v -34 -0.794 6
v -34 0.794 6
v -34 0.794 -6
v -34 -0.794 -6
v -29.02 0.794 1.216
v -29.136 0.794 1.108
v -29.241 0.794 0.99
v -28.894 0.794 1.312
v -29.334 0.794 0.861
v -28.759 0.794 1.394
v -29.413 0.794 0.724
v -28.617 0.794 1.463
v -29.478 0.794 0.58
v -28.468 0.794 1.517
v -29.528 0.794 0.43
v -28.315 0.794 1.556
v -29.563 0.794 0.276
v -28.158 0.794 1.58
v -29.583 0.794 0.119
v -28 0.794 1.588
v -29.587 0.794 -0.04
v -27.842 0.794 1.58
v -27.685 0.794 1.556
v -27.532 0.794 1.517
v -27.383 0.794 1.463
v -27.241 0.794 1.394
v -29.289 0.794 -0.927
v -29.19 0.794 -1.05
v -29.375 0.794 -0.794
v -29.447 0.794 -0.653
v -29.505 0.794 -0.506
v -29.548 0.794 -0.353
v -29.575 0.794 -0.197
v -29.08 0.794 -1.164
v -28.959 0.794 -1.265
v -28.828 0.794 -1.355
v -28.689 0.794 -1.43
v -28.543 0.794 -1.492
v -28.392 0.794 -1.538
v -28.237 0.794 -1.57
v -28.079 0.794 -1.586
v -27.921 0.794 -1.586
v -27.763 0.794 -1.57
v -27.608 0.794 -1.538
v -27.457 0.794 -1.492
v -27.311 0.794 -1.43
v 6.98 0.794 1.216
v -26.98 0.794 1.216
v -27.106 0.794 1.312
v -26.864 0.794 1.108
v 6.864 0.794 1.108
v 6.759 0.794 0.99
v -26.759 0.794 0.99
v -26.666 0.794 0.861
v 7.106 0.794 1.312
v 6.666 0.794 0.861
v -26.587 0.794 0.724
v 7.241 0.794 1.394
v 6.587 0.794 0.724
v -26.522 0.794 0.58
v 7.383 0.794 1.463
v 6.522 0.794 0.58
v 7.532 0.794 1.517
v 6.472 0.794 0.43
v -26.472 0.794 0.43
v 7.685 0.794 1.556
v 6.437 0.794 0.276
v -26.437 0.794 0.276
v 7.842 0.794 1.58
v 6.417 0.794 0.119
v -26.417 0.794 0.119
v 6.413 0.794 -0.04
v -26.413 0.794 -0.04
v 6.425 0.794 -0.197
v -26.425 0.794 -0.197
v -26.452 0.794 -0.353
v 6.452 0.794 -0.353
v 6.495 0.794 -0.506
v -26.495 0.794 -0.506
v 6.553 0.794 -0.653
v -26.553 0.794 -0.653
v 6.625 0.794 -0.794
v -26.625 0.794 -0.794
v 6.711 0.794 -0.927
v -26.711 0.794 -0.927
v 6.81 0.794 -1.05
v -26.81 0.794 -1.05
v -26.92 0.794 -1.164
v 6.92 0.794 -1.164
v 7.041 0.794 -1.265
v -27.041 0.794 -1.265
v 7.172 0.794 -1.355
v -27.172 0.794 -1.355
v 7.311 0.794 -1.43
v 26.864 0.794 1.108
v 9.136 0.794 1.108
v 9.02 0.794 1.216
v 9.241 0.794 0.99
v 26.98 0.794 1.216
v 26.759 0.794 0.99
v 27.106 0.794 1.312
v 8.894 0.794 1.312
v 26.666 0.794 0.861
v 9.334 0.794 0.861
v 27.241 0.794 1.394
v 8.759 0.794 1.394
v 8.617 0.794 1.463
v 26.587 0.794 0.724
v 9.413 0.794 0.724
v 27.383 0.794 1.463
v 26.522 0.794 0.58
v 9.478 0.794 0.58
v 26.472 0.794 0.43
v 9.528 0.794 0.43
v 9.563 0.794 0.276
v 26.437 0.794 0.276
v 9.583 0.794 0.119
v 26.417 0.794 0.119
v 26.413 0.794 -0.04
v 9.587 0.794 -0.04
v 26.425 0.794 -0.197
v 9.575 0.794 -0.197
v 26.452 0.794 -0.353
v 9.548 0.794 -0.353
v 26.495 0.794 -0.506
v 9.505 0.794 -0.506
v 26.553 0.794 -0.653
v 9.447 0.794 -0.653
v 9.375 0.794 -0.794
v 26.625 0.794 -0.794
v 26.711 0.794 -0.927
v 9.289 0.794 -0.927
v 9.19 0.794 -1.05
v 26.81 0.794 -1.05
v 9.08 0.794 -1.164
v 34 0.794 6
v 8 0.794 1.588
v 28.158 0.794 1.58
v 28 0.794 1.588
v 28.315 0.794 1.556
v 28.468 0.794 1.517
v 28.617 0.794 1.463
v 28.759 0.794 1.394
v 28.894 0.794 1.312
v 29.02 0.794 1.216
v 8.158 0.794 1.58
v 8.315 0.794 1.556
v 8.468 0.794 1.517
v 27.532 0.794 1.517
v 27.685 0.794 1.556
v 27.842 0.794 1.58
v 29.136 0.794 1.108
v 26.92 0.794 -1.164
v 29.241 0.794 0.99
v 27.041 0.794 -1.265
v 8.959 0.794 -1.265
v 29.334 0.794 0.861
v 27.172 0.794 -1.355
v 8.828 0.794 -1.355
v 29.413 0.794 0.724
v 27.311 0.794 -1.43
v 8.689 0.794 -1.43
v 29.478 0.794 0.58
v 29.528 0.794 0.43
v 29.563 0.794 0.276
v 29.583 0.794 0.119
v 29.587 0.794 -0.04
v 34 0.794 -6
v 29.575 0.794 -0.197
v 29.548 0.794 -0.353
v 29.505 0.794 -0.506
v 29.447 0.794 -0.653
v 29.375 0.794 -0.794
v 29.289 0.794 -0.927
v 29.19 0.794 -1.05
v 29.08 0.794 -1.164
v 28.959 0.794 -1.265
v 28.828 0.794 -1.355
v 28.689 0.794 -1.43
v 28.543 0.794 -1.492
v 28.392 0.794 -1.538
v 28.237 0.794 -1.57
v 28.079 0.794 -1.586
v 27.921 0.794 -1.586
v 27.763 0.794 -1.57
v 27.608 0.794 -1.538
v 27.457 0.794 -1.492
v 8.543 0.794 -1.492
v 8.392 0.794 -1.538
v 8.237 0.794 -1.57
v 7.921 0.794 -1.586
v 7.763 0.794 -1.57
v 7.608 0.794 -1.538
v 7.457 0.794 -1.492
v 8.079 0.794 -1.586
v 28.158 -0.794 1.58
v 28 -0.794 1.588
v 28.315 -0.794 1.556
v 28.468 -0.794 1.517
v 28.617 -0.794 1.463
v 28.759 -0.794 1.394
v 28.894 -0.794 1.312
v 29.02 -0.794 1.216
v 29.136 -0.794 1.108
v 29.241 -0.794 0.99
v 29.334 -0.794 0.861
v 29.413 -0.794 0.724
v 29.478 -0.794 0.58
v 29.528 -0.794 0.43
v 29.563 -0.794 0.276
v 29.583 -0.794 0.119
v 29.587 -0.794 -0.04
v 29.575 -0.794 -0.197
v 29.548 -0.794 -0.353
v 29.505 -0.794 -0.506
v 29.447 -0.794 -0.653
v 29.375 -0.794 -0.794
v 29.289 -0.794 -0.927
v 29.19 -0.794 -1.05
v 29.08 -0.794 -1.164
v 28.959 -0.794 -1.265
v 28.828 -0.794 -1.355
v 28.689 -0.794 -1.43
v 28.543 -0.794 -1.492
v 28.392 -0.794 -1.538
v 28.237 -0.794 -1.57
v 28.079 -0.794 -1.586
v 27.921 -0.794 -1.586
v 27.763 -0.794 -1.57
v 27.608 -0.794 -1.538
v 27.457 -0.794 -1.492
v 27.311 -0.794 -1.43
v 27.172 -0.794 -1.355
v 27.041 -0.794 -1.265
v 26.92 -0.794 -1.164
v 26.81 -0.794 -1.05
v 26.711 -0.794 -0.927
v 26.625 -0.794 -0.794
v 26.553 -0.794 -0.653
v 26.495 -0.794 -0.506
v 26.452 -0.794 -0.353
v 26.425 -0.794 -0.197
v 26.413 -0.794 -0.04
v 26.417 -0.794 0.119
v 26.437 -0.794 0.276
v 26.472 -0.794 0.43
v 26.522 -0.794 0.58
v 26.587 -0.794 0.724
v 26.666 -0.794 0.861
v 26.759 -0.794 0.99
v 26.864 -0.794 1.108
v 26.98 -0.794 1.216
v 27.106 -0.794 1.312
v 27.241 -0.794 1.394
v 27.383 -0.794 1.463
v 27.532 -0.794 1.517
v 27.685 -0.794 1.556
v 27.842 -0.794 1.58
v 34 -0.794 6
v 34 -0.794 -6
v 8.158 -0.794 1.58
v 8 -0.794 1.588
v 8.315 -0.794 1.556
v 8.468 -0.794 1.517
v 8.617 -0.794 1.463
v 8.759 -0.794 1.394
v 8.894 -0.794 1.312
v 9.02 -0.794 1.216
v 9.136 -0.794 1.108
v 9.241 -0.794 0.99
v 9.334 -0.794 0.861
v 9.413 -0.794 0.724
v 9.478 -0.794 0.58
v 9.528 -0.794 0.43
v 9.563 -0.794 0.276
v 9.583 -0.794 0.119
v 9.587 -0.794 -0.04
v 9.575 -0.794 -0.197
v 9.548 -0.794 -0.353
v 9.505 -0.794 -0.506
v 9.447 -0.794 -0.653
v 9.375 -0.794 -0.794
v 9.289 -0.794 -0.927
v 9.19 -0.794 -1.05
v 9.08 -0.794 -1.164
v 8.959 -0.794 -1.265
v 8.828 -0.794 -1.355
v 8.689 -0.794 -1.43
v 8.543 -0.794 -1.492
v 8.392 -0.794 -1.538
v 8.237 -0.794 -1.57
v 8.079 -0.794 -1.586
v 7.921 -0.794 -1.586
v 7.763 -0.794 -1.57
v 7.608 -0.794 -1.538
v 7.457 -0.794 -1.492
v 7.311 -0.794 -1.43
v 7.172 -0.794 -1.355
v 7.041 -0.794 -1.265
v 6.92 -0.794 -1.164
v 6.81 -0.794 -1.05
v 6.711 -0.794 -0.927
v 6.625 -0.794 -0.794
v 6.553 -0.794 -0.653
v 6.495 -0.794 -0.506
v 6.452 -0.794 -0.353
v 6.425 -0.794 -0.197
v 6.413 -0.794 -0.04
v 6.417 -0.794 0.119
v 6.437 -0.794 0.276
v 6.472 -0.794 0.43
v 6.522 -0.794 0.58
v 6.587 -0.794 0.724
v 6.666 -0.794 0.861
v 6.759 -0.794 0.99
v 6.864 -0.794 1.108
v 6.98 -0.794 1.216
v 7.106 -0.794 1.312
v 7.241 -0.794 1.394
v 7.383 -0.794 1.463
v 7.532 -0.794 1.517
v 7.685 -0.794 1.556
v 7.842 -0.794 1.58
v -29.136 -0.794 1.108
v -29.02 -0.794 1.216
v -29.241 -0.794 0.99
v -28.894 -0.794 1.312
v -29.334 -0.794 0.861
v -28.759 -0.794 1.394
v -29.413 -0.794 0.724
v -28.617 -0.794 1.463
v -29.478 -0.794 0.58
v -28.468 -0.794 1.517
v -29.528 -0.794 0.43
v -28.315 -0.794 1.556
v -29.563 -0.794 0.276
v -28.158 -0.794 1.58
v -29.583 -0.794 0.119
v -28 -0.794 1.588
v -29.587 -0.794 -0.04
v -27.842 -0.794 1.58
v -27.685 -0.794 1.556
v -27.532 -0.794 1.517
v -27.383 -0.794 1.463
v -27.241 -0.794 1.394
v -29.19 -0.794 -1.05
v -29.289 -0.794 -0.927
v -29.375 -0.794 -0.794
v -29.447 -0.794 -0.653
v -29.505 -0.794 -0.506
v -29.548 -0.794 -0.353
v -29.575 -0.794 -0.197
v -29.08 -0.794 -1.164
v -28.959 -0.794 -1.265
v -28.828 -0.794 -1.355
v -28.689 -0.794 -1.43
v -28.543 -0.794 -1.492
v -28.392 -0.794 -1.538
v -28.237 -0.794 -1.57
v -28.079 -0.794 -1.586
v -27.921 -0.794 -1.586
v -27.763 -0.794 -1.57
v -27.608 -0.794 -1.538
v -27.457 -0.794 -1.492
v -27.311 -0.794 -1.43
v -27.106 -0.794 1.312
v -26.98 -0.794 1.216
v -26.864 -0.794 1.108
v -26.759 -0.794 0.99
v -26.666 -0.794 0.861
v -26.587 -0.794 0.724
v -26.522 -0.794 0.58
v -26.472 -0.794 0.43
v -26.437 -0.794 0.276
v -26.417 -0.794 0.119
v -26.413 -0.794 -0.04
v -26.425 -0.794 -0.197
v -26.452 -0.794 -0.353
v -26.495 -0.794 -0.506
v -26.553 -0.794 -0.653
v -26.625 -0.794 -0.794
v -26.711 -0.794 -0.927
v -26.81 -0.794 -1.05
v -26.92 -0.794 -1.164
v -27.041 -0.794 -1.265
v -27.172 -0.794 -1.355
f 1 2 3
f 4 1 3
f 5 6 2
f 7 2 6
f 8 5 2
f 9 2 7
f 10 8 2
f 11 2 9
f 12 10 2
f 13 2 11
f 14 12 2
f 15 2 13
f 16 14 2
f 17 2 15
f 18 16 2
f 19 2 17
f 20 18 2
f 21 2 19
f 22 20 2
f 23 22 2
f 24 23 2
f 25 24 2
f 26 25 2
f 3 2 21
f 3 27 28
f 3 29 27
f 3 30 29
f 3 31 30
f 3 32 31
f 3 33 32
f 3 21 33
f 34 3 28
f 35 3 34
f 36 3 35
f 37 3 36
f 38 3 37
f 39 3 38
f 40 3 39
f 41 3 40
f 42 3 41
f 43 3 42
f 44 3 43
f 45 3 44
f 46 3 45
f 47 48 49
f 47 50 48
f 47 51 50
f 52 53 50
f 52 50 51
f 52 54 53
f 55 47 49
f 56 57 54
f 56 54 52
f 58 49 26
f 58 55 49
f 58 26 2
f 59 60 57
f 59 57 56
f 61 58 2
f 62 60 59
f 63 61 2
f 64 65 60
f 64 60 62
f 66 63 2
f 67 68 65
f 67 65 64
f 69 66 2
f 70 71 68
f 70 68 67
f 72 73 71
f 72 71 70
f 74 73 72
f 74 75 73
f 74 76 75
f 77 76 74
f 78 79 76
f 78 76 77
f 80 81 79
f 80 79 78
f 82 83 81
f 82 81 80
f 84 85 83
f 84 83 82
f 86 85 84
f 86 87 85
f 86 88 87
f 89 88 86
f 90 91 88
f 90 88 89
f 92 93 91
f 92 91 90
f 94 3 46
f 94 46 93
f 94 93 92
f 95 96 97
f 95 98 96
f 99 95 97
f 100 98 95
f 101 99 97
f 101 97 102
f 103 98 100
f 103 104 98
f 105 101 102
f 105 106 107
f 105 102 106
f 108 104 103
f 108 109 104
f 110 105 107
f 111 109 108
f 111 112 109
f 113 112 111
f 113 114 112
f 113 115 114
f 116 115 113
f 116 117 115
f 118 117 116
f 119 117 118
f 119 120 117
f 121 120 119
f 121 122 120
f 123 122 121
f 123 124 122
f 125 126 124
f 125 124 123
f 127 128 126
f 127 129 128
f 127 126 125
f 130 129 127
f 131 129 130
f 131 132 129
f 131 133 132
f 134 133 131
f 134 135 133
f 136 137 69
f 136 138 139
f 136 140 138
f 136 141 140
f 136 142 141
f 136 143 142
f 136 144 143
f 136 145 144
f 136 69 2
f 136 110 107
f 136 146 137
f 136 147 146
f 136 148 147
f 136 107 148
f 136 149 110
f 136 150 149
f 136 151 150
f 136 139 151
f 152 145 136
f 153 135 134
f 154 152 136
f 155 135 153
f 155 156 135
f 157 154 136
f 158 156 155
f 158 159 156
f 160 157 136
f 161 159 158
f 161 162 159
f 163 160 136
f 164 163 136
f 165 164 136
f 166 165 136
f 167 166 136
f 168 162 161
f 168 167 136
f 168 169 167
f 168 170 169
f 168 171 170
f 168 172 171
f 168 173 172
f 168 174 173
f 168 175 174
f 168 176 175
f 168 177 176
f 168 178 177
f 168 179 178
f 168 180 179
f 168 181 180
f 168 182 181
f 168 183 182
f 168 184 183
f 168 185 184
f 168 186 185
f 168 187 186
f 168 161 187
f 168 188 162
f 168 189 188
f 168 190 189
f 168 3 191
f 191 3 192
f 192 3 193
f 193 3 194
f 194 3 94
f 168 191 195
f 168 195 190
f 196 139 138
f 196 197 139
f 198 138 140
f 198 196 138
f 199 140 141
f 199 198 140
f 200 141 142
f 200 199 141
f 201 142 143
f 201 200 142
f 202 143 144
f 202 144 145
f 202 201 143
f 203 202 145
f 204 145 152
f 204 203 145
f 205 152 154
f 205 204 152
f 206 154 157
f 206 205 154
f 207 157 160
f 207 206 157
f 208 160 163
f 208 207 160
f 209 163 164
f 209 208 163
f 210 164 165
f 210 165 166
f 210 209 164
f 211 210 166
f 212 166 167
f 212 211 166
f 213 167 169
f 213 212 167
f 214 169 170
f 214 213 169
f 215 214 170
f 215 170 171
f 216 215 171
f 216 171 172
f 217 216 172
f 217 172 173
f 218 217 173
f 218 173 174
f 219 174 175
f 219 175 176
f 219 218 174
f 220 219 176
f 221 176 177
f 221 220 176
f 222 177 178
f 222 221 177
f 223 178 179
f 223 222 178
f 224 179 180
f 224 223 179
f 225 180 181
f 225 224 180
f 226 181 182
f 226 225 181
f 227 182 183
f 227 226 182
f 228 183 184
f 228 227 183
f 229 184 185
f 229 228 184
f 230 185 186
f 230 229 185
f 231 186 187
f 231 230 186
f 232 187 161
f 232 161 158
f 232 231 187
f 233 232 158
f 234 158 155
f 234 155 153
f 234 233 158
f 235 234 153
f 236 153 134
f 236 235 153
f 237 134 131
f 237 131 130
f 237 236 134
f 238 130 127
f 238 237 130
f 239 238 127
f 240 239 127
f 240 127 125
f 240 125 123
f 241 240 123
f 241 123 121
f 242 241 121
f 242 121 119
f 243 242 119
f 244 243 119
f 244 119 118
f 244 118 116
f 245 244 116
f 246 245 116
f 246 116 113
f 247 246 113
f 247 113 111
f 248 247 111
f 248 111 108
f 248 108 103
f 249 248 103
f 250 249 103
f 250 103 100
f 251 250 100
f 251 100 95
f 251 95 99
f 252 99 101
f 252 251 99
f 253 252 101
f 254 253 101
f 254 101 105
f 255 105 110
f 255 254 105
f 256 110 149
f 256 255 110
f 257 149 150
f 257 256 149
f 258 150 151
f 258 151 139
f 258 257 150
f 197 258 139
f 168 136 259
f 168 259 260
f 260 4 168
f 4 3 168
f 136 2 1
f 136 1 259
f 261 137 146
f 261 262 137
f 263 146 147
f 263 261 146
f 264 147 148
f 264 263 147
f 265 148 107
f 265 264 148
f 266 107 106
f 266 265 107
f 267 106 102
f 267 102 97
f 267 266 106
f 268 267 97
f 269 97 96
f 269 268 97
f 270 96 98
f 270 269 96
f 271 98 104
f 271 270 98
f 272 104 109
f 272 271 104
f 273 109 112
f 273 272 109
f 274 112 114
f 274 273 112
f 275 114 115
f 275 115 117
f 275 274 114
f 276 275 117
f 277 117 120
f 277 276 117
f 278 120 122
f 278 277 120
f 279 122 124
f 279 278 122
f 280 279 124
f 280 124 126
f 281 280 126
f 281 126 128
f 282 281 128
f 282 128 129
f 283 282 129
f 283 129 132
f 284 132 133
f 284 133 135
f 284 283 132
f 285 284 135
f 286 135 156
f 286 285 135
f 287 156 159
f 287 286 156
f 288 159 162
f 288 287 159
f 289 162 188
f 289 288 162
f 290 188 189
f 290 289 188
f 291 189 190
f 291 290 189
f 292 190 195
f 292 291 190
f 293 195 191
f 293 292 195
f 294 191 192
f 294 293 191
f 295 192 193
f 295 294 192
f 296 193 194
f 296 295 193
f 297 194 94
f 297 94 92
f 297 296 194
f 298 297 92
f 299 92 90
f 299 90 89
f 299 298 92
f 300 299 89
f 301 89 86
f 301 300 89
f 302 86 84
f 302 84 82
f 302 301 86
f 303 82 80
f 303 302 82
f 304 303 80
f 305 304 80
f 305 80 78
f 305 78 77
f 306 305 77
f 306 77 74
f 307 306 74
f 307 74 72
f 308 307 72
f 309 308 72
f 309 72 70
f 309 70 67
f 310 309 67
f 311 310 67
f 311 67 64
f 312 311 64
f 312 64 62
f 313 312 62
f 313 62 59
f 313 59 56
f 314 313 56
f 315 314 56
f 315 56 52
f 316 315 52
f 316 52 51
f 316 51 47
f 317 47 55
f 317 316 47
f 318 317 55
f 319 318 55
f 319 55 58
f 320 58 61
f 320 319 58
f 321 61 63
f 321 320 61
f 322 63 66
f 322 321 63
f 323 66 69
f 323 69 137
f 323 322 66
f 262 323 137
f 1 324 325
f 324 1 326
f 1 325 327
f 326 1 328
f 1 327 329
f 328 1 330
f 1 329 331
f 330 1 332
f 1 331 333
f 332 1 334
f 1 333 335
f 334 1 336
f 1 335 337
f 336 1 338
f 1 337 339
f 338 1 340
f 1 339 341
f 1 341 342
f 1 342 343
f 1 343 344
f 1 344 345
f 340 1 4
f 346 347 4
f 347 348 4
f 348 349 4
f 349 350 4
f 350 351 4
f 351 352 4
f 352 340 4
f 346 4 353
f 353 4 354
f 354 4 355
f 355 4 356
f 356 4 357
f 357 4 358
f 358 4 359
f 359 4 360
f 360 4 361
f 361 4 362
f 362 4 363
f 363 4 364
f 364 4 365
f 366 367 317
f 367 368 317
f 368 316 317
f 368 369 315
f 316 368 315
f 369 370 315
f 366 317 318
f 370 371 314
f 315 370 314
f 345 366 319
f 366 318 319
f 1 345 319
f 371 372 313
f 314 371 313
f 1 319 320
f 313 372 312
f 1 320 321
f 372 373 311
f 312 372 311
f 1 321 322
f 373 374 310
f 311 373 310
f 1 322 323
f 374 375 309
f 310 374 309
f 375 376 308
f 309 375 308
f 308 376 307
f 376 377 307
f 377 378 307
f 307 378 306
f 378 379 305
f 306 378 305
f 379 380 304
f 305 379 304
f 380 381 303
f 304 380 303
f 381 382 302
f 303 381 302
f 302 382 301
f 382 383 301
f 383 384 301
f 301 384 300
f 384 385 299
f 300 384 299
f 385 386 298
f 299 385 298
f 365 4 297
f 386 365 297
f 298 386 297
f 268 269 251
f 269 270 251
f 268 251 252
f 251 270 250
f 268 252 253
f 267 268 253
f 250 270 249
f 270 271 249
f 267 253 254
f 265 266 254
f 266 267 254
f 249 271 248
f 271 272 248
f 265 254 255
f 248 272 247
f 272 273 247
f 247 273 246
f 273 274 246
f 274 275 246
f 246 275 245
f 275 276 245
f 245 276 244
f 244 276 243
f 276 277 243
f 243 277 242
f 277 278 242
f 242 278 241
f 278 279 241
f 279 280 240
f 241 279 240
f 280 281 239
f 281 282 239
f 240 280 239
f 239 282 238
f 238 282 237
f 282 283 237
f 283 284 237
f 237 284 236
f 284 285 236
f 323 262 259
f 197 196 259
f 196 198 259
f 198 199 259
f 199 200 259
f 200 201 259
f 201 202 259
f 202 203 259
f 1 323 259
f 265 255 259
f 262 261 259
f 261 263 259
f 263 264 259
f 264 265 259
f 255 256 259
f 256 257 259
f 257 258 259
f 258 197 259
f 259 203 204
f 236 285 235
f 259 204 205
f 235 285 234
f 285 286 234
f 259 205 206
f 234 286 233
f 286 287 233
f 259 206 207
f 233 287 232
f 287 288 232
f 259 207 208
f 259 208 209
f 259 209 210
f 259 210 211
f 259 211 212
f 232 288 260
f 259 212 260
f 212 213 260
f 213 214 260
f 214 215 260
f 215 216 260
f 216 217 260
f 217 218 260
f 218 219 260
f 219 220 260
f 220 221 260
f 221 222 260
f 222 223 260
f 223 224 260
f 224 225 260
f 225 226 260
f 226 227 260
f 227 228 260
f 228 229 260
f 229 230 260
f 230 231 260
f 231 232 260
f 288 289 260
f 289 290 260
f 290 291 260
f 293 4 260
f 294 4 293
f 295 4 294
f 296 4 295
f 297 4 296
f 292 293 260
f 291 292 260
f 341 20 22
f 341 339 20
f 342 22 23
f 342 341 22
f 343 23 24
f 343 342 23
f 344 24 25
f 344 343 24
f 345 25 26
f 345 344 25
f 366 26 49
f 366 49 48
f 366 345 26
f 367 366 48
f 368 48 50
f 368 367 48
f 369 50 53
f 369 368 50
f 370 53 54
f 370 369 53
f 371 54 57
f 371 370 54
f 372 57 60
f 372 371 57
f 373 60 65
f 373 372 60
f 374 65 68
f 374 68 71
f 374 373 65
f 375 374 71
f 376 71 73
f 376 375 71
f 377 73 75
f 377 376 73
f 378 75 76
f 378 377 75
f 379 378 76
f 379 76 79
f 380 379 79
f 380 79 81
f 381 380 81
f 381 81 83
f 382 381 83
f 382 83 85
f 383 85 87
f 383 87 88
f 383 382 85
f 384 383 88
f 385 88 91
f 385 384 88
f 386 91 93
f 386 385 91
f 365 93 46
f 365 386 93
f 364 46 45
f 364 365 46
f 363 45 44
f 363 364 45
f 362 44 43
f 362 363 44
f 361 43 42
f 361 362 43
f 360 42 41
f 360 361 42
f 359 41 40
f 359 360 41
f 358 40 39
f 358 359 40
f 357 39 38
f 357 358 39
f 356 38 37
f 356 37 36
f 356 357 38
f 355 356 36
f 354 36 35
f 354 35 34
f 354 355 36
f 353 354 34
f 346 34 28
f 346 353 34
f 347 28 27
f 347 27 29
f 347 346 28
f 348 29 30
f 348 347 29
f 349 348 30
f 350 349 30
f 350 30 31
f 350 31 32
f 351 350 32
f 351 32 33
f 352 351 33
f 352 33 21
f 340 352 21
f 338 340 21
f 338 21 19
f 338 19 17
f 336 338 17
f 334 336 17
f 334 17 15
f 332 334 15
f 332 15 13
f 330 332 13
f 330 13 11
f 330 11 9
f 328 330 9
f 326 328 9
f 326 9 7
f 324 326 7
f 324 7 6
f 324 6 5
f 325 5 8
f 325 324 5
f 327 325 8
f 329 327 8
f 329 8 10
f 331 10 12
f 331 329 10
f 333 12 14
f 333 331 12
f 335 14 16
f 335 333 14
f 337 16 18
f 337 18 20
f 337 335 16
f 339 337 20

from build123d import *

# Parameters (mm, degrees)
SKETCH1_W           = 68
SKETCH1_H           = 12
SKETCH1_R           = 1.5875
BOSS_EXTRUDE1_DEPTH = 0.79375


with BuildPart() as part:
    # Sketch1 → Boss-Extrude1 (new, symmetric)
    with BuildSketch(Plane(origin=(0, 0, 0), x_dir=(1, 0, 0), z_dir=(0, 1, 0))):
        Rectangle(SKETCH1_W, SKETCH1_H)
        with Locations(Location((-28, 0, 0), (0, 0, 270))):
            Circle(SKETCH1_R, mode=Mode.SUBTRACT)
        with Locations(Location((28, 0, 0), (0, 0, 270))):
            Circle(SKETCH1_R, mode=Mode.SUBTRACT)
        with Locations(Location((8, 0, 0), (0, 0, 270))):
            Circle(SKETCH1_R, mode=Mode.SUBTRACT)
    extrude(amount=BOSS_EXTRUDE1_DEPTH, both=True)


solid = part.part
